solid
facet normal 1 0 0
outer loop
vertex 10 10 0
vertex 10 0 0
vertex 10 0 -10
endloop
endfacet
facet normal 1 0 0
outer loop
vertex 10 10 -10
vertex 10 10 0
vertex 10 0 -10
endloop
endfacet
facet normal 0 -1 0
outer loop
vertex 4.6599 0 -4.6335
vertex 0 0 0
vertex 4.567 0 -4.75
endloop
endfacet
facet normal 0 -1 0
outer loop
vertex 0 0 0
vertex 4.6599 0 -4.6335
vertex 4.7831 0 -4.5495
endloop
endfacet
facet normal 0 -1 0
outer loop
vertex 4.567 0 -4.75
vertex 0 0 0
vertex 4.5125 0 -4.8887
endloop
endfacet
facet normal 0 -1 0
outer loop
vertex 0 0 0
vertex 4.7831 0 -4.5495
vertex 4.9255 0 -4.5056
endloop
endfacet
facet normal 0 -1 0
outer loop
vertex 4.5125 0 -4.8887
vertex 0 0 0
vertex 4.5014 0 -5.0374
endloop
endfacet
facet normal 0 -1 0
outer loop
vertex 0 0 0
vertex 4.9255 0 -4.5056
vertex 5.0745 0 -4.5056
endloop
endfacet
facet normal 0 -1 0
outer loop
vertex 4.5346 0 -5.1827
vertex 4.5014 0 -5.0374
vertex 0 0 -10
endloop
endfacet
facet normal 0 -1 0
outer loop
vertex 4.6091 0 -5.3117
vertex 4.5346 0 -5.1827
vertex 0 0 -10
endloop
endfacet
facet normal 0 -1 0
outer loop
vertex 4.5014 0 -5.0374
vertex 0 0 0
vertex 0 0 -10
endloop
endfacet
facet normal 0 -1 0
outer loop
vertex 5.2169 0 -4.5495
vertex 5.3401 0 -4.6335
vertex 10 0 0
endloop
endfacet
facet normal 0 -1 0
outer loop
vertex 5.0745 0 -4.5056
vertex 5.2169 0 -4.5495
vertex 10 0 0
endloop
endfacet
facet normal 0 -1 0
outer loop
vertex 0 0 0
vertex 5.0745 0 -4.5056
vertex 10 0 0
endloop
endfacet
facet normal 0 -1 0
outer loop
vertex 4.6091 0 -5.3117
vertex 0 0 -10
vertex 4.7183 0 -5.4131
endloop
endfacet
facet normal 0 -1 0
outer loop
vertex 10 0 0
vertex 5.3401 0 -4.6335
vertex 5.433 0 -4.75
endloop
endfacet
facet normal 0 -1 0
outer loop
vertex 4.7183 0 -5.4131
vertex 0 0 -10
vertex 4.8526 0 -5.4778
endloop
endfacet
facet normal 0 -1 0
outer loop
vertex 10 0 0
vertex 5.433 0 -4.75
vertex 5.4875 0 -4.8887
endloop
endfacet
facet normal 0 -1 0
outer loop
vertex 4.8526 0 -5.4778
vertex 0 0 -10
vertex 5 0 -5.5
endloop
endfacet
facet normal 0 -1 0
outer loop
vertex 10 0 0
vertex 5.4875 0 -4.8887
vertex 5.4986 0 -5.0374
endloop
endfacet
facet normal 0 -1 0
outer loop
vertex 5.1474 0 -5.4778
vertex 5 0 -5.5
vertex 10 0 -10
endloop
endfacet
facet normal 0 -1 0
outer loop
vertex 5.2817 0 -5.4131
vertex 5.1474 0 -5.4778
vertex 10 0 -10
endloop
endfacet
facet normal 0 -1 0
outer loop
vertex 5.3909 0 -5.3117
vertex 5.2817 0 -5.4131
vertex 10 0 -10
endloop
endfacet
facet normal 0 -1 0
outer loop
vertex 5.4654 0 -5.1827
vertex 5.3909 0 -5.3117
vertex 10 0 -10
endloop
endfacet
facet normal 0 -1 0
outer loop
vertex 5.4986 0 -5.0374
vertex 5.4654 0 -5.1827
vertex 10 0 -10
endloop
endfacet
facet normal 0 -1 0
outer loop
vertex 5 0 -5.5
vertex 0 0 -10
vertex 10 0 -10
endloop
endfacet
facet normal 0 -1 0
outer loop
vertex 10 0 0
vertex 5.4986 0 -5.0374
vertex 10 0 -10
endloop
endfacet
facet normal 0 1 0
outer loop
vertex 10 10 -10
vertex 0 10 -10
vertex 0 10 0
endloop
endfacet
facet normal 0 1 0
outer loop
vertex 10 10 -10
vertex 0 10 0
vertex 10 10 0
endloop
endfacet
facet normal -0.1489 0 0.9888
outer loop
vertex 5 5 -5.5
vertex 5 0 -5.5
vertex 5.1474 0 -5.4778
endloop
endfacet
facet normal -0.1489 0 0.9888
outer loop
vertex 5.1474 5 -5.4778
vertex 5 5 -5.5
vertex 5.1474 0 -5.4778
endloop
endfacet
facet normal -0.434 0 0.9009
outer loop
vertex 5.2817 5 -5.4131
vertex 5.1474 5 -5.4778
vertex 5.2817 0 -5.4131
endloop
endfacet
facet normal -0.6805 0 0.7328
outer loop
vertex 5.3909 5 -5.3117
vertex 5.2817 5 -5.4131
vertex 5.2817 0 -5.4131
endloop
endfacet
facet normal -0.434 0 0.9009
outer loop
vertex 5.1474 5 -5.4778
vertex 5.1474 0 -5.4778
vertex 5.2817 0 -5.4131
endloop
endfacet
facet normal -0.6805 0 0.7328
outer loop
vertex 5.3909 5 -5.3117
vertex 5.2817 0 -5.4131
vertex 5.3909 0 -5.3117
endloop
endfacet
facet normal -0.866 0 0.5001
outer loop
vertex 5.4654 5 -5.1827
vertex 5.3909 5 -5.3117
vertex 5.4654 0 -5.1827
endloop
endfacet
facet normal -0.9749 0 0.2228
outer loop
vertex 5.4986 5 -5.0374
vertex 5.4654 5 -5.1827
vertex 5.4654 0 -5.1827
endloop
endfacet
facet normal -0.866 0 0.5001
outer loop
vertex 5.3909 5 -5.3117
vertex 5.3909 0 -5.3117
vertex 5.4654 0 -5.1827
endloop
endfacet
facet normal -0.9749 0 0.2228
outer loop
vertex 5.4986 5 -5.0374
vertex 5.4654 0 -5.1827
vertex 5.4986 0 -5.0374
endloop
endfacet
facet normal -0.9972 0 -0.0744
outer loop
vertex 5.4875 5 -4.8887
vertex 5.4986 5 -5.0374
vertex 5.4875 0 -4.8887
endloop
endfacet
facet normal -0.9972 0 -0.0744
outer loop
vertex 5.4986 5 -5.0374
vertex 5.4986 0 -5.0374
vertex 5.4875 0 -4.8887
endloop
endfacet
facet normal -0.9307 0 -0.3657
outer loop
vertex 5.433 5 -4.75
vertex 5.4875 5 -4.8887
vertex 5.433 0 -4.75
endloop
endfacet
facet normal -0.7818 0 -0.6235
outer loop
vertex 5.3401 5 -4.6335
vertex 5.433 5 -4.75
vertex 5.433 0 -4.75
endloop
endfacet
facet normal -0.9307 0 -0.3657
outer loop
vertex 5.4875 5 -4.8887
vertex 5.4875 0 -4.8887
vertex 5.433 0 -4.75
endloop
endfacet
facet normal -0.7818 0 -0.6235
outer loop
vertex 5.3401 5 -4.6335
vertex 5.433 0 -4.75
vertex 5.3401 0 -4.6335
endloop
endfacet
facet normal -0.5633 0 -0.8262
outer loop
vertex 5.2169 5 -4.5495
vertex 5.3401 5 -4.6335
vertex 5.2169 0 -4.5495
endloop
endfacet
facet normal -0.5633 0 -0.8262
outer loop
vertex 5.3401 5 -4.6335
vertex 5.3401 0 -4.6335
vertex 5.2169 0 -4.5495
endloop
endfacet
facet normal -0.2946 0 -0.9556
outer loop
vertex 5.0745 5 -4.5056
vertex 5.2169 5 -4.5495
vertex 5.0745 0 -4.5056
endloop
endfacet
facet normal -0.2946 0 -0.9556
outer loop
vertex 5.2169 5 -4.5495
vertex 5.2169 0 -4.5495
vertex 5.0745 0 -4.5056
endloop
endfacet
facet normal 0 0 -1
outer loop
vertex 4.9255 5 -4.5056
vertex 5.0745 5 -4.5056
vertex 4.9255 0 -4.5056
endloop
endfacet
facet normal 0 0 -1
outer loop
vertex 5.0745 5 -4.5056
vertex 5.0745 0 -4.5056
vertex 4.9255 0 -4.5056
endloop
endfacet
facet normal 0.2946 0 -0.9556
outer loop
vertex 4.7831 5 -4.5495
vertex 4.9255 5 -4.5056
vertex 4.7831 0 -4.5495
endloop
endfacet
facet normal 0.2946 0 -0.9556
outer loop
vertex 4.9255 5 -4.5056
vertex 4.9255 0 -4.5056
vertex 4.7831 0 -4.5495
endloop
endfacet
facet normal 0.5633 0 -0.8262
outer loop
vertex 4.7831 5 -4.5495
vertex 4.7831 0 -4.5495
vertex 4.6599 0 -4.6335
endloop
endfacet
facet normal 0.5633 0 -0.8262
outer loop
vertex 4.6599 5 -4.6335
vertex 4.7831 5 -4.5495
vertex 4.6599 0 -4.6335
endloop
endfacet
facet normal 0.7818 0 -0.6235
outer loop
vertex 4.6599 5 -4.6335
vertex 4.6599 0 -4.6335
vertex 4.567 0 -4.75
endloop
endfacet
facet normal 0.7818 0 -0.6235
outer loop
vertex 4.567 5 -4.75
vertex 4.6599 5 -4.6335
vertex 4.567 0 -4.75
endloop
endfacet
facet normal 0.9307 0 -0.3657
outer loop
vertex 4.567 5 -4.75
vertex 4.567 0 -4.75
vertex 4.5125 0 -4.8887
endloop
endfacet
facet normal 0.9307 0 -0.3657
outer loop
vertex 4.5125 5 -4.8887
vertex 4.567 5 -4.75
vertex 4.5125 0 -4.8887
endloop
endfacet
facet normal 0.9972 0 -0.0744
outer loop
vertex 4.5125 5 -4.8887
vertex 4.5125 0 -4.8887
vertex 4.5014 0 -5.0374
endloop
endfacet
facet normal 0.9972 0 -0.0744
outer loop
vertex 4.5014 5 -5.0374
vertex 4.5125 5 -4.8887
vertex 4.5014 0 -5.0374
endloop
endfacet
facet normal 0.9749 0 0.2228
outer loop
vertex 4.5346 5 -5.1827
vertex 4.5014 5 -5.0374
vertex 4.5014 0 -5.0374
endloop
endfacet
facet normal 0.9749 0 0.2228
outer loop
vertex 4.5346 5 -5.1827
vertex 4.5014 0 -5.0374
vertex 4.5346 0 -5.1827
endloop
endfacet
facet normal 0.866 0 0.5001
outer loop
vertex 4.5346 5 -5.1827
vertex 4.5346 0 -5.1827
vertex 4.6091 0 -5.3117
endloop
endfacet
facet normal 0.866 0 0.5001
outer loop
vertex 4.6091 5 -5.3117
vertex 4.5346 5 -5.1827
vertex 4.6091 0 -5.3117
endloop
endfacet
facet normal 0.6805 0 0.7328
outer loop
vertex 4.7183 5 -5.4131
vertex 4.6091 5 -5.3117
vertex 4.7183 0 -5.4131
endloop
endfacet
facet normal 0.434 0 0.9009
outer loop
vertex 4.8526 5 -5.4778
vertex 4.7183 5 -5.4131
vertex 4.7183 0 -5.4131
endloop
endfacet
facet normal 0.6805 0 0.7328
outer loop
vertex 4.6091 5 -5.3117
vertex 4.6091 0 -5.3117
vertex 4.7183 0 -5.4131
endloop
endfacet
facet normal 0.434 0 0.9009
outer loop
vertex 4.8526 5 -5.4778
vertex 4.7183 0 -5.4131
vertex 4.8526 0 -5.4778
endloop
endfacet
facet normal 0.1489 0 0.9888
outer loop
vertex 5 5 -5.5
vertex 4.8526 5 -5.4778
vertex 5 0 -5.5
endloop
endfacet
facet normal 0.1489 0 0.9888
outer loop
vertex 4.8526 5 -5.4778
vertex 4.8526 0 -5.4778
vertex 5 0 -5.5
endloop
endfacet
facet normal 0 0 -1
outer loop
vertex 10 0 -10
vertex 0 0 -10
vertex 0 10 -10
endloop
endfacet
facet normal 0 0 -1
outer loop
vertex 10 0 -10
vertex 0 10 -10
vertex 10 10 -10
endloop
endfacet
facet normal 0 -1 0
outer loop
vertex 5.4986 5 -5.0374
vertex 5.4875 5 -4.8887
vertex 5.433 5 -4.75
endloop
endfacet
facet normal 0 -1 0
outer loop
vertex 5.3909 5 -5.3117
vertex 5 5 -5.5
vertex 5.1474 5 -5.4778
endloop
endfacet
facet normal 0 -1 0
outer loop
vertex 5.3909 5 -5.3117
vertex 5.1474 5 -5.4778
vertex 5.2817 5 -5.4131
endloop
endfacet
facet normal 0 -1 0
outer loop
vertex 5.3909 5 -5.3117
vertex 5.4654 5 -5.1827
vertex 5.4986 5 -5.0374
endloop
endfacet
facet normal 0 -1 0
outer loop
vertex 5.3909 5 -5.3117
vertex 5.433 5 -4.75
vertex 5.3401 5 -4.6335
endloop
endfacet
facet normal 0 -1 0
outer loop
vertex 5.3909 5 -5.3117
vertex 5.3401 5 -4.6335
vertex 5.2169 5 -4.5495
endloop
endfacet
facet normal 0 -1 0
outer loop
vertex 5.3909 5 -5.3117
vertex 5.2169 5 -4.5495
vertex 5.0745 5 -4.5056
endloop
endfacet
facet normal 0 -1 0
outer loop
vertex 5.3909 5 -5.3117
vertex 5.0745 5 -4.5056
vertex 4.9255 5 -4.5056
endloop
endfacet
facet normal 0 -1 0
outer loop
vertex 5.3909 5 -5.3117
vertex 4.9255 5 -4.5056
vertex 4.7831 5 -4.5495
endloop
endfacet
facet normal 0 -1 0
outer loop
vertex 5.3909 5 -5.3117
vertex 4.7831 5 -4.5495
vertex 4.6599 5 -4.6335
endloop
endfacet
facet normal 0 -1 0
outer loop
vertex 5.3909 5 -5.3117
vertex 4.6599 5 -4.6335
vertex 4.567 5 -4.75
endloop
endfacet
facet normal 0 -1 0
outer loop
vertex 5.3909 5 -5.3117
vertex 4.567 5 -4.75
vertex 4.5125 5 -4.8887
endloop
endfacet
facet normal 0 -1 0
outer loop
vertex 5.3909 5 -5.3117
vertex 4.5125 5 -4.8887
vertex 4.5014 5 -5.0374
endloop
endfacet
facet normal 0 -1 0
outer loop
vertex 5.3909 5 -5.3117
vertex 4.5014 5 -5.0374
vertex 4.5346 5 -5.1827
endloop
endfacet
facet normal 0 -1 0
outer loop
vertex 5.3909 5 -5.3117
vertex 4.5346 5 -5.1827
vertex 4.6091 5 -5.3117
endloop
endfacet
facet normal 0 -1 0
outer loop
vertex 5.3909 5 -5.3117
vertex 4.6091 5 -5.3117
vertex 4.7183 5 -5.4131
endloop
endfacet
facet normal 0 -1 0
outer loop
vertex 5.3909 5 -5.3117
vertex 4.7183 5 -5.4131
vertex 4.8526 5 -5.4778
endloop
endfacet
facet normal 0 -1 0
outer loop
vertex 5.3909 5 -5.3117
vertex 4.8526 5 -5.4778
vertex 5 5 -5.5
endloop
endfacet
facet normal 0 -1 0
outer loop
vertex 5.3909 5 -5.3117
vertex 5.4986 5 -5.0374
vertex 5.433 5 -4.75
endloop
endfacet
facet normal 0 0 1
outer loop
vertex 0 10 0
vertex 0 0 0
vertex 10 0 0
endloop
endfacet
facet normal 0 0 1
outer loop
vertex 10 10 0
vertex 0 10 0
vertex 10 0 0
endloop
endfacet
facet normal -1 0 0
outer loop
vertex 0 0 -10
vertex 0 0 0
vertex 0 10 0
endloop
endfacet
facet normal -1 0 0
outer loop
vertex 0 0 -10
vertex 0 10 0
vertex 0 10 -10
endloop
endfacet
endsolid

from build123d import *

# Parameters (mm, degrees)
CROQUIS1_W              = 10
CROQUIS1_H              = 10
SALIENTE_EXTRUIR1_DEPTH = 10
CROQUIS2_R              = 0.5
CORTAR_EXTRUIR1_DEPTH   = 5


with BuildPart() as part:
    # Croquis1 → Saliente-Extruir1 (new body)
    with BuildSketch(Plane(origin=(0, 0, 0), x_dir=(1, 0, 0), z_dir=(0, 1, 0))):
        with Locations((5, 5)):
            Rectangle(CROQUIS1_W, CROQUIS1_H)
    extrude(amount=SALIENTE_EXTRUIR1_DEPTH)

    # Croquis2 → Cortar-Extruir1 (cut)
    with BuildSketch(Plane.XZ):
        with Locations(Location((5, -5, 0), (0, 0, 270))):
            Circle(CROQUIS2_R)
    extrude(amount=-CORTAR_EXTRUIR1_DEPTH, mode=Mode.SUBTRACT)


solid = part.part
